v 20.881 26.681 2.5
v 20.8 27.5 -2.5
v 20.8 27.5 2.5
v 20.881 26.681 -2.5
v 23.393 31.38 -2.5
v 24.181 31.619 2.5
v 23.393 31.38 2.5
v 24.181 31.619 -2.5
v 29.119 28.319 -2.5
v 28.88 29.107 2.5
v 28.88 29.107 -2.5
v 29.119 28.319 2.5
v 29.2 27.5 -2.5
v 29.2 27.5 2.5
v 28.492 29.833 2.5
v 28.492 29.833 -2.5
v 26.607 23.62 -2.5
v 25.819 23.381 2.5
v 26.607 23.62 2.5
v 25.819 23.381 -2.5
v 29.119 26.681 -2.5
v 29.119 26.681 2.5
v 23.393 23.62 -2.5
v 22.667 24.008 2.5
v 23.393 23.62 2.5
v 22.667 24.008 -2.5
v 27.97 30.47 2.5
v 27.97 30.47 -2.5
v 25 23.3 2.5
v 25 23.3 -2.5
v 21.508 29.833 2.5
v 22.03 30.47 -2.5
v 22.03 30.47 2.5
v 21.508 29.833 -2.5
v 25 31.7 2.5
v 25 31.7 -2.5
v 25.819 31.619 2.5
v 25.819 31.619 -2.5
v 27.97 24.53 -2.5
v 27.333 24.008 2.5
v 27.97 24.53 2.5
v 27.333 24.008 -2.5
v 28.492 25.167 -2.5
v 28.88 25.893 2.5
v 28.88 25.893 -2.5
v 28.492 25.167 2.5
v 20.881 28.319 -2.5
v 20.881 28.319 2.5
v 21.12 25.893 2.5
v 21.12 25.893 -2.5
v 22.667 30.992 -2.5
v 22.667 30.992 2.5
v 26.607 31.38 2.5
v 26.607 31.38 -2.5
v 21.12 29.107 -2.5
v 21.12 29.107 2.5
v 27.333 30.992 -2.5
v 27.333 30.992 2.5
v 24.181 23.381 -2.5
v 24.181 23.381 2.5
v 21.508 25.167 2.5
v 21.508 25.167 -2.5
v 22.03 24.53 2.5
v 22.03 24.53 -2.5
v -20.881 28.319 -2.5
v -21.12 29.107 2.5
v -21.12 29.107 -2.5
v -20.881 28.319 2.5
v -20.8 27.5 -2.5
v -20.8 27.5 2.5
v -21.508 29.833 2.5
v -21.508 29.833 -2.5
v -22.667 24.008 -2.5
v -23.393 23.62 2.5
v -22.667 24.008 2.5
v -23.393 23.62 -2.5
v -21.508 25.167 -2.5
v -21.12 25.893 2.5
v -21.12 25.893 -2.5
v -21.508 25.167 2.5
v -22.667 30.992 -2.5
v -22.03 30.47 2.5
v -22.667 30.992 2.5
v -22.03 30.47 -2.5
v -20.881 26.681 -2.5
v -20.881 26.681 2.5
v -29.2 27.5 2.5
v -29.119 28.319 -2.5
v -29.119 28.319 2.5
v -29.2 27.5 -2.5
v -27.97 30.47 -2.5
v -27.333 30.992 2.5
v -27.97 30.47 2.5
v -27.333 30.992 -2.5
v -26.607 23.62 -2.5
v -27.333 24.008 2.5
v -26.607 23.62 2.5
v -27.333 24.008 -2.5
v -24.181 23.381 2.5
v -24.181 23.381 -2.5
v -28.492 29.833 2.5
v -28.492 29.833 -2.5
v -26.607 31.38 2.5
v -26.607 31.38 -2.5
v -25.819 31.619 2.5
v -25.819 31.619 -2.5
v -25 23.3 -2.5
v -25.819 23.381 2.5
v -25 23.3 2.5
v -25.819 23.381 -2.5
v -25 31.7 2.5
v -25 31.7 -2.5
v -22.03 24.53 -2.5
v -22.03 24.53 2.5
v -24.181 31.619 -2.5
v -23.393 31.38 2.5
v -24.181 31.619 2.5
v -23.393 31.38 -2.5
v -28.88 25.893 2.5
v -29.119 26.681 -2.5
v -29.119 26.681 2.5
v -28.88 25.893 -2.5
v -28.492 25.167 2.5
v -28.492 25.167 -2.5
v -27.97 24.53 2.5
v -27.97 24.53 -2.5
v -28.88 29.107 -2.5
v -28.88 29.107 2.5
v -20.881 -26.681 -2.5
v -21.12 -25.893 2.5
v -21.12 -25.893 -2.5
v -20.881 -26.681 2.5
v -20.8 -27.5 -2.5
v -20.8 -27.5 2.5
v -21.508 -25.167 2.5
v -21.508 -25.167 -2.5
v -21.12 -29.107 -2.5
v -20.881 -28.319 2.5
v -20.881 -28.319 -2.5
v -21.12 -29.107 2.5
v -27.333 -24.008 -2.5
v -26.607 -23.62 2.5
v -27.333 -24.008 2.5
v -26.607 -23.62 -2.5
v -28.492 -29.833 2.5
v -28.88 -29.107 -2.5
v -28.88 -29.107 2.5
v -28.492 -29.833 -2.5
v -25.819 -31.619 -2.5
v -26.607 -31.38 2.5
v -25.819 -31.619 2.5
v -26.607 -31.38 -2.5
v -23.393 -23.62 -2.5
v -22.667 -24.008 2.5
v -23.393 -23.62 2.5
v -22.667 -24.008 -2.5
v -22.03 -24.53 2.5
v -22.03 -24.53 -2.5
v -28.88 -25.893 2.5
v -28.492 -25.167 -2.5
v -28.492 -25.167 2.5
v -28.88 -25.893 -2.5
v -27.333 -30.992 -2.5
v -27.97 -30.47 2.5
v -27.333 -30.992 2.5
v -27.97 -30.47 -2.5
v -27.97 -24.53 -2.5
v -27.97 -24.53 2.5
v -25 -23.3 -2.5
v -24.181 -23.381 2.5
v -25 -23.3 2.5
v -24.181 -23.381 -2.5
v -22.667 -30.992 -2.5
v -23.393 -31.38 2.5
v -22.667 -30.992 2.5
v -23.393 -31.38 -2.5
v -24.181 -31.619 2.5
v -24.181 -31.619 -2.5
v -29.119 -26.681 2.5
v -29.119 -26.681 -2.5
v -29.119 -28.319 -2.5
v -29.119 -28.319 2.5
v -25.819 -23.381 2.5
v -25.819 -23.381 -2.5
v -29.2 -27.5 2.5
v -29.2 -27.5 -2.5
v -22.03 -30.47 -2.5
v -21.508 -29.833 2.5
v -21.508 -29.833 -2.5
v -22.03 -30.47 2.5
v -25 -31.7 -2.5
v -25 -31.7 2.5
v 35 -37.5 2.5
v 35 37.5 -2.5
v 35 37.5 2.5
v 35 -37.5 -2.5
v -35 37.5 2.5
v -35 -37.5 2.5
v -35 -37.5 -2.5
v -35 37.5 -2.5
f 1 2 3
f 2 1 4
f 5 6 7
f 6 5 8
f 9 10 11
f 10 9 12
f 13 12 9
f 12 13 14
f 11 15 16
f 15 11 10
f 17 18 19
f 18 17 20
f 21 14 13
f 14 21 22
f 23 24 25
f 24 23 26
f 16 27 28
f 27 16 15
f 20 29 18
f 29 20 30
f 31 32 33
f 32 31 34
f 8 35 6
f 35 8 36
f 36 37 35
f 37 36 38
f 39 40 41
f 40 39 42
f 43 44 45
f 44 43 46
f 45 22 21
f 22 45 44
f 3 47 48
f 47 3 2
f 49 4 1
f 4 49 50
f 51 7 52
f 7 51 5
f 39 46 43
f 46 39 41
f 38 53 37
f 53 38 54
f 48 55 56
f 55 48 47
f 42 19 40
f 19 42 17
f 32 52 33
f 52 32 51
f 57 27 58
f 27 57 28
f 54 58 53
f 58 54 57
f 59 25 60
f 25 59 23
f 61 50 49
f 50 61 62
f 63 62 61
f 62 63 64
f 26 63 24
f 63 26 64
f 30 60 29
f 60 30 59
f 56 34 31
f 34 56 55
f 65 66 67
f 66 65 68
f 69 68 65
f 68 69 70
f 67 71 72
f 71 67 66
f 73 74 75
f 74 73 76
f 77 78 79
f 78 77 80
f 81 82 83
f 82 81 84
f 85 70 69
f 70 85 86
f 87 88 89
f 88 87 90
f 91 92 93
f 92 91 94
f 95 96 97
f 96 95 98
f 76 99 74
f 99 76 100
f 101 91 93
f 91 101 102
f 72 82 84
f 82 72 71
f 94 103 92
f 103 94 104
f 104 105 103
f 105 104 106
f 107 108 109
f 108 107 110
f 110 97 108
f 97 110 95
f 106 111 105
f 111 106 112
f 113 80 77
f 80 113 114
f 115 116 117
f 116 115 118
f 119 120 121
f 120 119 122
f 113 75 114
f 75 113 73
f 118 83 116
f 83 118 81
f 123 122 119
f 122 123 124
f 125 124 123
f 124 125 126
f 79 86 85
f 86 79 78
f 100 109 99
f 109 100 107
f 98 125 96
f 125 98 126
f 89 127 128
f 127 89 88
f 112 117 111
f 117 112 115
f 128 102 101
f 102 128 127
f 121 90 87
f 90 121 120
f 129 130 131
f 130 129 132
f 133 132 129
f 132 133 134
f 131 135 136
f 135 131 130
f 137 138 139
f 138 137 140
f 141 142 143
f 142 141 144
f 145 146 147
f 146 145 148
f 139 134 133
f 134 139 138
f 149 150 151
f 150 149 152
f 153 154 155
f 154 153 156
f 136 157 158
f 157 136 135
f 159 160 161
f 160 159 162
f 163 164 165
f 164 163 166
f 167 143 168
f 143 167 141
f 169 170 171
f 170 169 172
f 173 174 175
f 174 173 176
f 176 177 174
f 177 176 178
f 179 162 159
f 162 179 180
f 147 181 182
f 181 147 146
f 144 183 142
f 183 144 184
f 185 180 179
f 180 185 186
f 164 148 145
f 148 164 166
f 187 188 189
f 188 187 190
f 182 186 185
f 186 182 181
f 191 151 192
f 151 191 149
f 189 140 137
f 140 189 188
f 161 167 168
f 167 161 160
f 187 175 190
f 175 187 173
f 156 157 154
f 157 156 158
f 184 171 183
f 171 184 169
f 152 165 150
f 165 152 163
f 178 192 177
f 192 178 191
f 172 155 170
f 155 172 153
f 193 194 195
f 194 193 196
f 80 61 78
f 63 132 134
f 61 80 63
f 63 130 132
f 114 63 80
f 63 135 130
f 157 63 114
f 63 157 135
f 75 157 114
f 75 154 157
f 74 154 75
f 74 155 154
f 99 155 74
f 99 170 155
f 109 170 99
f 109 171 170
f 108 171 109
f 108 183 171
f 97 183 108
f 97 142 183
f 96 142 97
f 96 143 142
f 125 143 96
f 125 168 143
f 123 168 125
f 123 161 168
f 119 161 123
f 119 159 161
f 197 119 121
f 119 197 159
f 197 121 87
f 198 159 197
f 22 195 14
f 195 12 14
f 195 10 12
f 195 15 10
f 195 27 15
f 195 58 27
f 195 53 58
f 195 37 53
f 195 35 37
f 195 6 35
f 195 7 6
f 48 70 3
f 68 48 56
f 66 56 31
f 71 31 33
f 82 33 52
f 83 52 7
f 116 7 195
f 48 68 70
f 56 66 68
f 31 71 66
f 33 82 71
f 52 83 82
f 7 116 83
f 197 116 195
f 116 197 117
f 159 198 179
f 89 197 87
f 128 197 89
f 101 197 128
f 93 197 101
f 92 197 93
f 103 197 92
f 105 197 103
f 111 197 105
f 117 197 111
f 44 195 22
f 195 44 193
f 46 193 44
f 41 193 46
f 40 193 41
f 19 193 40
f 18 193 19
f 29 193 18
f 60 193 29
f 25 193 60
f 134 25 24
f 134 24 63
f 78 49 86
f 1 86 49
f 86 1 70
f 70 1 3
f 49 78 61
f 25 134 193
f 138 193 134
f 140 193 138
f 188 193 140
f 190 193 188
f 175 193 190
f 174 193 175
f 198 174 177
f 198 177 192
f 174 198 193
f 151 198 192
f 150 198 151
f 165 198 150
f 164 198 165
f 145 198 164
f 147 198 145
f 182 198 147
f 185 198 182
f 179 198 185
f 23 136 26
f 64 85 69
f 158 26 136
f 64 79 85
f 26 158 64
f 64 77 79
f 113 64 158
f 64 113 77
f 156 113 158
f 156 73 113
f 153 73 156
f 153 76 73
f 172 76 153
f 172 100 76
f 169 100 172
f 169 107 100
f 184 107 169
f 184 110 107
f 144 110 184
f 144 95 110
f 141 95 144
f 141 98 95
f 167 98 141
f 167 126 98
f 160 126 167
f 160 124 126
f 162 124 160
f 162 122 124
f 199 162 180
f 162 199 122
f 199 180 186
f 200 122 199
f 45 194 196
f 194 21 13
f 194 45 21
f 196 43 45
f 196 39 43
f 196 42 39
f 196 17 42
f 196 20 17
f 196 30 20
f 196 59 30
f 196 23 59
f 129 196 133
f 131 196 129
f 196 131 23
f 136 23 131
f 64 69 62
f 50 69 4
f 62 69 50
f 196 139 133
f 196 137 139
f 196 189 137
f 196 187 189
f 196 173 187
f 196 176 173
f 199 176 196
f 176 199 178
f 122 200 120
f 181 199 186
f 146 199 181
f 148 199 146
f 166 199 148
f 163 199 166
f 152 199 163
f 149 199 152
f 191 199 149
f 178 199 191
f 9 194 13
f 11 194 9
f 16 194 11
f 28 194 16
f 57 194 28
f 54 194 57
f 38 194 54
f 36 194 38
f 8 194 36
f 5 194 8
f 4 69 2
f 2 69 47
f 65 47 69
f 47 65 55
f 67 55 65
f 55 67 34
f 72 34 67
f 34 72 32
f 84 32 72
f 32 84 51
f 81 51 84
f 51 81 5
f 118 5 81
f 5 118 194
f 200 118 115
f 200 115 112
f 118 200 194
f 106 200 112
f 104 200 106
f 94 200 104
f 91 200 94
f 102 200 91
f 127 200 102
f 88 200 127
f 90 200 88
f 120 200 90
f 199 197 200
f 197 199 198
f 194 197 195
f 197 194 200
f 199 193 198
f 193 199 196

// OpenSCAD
$fn = 32;

// ----------------------------------------------------------------------
// Corner plate 70 x 75 x 5
// 3 holes, centres taken from the edge offset
// ----------------------------------------------------------------------

// --- parameters (mm) ---
plate = [70, 75, 5];  // overall size (x, y, z)
seat_tol = 0.1;       // tolerance at the seating features
free_tol = 0.3;       // general tolerance on the free sizes
holes = 3;            // number of holes the drawing asks for
hole_d = 8.4;         // hole diameter
edge = 10;            // hole centre offset from the plate edge

// --- derived feature positions (mm) ---
corner_x = plate[0] / 2 - edge;  // = 25   corner hole X
corner_y = plate[1] / 2 - edge;  // = 27.5   corner hole Y
feature_centers = [
  [corner_x, corner_y],
  [-corner_x, corner_y],
  [-corner_x, -corner_y]
];   // hole centres the loop below drills

// plate outline, every hole drilled through with the same cutters
difference() {
  cube(plate, center = true);
  for (centre = feature_centers)
    translate([centre[0], centre[1], 0])
      cylinder(d = hole_d, h = plate[2] + 2, center = true);
}
